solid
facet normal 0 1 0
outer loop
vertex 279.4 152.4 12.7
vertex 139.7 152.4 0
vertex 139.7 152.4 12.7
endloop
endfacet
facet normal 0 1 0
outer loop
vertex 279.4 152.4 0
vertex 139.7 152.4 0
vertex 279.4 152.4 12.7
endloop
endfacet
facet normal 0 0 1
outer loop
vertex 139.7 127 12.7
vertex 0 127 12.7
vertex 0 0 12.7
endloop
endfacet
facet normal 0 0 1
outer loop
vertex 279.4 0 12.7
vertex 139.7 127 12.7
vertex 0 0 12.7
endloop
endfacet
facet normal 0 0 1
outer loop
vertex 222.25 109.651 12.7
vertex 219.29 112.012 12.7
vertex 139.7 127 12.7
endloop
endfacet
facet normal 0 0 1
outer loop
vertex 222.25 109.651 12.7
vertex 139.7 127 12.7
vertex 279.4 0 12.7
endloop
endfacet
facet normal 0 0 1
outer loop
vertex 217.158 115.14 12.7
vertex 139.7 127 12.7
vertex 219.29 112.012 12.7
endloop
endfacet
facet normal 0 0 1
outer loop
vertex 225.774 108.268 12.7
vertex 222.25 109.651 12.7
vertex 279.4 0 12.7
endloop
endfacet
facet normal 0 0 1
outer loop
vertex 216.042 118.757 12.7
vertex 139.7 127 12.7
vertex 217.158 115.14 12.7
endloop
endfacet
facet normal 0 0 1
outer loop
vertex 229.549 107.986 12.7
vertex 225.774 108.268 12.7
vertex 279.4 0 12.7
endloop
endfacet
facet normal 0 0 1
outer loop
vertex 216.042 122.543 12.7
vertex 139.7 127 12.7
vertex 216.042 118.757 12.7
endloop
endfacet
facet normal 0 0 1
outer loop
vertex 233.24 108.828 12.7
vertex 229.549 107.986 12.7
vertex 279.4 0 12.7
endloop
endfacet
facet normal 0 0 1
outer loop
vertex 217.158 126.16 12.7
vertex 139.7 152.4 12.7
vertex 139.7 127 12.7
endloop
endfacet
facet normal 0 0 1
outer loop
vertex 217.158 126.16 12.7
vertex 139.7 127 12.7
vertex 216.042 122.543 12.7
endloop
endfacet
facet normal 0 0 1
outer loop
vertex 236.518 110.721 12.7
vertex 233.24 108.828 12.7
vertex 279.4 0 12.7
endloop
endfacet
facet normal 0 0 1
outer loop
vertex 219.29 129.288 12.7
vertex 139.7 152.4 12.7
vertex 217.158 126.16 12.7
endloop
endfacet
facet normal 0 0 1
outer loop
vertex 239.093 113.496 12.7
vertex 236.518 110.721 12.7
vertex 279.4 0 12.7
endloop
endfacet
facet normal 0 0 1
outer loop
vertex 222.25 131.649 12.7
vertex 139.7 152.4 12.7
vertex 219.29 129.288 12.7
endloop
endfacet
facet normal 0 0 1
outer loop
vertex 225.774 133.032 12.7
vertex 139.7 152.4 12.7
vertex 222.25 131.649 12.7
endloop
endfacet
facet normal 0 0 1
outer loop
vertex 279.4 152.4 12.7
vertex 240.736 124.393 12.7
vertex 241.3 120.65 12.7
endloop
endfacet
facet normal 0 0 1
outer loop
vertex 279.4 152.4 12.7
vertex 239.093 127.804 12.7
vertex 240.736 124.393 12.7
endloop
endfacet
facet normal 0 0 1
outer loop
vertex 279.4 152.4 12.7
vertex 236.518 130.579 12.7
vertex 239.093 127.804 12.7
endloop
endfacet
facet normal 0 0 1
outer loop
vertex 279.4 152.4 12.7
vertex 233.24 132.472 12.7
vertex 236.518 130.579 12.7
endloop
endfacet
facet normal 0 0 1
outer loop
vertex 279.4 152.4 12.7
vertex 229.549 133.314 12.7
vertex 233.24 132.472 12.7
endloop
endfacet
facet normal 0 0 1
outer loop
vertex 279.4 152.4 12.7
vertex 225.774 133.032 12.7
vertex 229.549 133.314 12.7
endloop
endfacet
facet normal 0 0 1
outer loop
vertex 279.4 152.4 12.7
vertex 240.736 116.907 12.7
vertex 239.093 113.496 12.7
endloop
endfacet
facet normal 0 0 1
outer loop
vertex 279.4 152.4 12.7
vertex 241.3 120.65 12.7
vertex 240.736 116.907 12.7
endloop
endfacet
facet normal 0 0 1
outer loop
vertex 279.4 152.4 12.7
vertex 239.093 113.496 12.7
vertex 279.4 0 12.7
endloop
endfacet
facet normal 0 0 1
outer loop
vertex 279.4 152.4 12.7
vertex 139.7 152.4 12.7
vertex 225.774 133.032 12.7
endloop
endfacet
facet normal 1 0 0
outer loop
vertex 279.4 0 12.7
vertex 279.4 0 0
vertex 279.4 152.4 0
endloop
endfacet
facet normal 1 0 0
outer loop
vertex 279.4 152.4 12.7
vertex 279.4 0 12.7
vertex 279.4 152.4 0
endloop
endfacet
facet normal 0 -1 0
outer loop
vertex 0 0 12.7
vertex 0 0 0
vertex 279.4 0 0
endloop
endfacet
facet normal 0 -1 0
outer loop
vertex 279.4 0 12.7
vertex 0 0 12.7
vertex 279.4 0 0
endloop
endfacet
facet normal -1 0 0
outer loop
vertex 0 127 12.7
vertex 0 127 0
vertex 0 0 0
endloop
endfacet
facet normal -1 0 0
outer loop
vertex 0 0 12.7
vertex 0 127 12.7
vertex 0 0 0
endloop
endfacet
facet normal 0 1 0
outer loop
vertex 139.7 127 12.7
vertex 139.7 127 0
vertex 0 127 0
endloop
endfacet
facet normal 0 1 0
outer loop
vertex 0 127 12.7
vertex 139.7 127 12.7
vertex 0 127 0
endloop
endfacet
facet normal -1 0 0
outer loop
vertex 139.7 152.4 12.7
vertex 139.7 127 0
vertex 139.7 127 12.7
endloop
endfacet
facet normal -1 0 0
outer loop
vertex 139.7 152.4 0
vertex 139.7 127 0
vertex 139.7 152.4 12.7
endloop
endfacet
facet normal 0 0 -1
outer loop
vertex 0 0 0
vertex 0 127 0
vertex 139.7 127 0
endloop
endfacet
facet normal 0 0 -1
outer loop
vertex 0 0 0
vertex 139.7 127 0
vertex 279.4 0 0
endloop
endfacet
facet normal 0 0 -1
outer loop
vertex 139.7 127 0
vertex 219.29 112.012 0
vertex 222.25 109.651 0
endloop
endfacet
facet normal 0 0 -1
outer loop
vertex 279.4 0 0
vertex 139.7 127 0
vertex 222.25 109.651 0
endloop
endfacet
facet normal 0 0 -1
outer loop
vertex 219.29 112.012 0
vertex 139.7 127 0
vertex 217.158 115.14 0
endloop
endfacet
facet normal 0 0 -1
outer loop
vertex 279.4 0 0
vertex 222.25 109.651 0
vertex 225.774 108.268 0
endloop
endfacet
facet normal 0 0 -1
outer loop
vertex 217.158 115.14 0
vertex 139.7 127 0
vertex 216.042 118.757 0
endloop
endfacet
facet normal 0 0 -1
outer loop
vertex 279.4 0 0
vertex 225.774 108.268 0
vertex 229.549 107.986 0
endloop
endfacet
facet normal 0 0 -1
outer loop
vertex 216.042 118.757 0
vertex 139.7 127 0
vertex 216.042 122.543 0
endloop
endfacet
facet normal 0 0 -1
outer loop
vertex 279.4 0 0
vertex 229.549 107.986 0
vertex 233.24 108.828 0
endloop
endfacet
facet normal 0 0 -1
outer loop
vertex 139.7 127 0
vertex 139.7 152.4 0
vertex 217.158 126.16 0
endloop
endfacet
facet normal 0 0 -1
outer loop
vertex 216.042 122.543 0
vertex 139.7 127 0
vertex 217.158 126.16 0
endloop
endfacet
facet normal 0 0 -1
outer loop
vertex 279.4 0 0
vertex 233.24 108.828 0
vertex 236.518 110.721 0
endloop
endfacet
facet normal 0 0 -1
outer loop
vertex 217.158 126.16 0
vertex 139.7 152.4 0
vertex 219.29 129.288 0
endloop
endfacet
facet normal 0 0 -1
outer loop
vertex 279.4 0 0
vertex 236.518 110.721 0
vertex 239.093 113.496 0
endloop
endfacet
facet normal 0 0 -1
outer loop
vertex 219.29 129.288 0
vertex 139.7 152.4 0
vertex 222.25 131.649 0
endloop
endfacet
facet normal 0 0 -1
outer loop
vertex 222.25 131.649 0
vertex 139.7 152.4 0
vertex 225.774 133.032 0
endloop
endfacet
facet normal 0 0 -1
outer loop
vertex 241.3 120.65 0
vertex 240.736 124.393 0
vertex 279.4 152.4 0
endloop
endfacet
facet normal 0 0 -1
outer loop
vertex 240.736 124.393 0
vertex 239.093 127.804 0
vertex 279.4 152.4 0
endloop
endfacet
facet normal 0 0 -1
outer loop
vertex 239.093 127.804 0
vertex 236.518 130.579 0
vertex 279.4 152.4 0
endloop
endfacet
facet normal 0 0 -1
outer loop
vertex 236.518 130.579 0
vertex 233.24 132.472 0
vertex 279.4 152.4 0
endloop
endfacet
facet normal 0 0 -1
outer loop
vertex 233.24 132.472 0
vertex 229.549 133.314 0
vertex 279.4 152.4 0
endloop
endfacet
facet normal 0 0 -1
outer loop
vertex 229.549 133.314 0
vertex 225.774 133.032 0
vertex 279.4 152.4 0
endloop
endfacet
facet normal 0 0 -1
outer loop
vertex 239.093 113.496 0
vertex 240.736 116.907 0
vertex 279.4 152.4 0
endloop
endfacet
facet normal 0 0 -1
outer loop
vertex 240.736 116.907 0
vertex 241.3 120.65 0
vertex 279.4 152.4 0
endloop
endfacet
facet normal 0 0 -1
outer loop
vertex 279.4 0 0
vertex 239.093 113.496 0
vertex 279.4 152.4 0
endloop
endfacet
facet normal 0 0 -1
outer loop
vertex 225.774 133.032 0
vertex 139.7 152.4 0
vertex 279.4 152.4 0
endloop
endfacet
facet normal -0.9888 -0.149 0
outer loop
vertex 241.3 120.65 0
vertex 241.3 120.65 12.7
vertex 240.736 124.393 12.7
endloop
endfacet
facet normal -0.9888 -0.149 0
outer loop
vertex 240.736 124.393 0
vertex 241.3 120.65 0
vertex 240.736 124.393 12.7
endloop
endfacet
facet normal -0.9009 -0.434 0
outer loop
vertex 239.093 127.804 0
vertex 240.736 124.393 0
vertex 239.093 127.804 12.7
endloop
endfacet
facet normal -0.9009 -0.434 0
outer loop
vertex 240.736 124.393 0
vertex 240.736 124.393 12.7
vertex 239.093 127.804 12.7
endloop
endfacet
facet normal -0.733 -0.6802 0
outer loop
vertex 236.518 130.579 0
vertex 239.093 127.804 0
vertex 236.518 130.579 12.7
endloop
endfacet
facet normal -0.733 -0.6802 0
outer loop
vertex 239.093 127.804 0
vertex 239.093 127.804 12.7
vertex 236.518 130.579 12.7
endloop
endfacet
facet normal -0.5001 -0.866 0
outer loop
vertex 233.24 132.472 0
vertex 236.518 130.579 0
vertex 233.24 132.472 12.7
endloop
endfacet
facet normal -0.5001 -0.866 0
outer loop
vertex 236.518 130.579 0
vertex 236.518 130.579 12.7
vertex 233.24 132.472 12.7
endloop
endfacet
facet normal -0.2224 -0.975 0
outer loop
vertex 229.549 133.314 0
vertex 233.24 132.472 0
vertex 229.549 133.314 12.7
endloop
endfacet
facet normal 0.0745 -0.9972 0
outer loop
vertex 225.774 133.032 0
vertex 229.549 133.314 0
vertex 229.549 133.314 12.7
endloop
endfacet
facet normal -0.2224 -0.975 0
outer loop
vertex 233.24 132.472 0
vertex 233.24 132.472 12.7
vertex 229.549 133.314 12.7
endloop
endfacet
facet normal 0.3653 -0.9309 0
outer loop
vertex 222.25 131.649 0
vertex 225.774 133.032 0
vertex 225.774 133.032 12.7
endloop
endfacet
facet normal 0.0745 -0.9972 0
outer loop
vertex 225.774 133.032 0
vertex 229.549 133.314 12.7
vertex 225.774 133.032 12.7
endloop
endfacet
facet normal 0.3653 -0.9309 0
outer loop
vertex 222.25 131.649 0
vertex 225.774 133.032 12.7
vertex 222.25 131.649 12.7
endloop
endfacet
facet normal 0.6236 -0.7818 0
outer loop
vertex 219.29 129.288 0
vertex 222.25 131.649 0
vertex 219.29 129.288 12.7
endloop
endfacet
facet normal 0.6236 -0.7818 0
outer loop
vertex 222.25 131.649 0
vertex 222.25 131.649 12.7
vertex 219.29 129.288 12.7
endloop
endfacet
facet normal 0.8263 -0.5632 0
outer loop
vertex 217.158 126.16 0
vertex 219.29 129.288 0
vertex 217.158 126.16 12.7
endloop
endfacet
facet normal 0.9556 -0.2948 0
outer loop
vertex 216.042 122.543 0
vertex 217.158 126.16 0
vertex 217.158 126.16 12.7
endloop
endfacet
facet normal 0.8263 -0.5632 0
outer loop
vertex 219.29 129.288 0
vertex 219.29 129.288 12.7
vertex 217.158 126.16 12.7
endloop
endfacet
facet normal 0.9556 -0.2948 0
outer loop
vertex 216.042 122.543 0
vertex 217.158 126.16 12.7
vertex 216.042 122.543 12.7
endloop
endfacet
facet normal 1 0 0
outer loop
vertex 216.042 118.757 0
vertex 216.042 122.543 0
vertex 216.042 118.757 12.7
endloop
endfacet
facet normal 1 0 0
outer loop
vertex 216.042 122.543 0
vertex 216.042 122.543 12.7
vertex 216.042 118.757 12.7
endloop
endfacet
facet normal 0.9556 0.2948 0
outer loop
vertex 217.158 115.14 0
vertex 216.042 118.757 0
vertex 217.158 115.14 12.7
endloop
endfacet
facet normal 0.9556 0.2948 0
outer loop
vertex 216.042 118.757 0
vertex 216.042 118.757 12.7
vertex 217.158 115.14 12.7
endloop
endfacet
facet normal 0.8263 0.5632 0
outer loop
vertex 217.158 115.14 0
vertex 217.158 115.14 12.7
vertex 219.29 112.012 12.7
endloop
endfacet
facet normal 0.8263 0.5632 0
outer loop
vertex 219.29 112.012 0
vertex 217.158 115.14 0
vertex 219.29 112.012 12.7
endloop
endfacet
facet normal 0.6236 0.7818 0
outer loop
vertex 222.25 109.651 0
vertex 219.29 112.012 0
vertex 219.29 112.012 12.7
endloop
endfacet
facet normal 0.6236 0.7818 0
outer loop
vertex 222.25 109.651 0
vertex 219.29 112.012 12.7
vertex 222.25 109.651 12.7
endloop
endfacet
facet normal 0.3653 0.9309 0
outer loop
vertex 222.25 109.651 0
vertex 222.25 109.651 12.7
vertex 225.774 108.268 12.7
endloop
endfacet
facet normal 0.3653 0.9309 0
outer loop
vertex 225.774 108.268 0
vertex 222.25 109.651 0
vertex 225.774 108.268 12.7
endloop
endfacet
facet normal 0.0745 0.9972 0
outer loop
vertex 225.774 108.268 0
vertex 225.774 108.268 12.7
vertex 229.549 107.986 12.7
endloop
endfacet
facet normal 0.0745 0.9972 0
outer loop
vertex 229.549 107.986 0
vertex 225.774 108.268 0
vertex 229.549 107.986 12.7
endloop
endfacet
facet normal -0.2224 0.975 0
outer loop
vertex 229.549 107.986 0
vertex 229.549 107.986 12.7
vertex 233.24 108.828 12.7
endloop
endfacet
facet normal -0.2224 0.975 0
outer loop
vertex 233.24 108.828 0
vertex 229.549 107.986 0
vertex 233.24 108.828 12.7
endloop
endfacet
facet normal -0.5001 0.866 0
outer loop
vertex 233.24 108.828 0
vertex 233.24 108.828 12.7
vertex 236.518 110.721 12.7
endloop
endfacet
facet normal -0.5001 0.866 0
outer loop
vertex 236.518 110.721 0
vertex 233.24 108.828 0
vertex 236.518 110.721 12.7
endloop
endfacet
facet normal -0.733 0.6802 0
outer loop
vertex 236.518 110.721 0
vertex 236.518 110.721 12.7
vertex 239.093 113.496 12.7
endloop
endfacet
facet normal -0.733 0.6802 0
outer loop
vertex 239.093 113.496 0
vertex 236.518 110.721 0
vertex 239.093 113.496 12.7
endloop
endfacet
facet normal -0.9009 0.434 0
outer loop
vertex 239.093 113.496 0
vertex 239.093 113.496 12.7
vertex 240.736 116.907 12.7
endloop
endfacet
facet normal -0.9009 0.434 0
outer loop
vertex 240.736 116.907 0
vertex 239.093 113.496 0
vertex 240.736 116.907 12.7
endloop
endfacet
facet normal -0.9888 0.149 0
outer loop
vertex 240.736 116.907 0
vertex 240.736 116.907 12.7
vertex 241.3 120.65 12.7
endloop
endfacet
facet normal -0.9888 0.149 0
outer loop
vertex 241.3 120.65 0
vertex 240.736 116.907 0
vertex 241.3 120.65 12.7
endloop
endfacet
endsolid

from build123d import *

# Parameters (mm, degrees)
F0_W     = 139.7
F0_H     = 25.4
F1_DEPTH = 12.7
F2_R     = 12.7
F3_DEPTH = 12.701


# Not quite as in the source:
# - a feature names something its author has since deleted; it is built from what else it names


with BuildPart() as f1:
    # F0 (on Top) → F1 (new body)
    with BuildSketch(Plane.XY):
        Polygon((0, 127), (0, 0), (279.4, 0), (279.4, 127), (139.7, 127), align=None)
        with Locations((209.55, 139.7)):
            Rectangle(F0_W, F0_H)
    extrude(amount=F1_DEPTH)

    # F2 (on face) → F3 (cut, through all)
    with BuildSketch(Plane.XY.offset(12.7)):
        with Locations((228.6, 120.65)):
            Circle(F2_R)
    extrude(amount=-F3_DEPTH, mode=Mode.SUBTRACT)


solid = f1.part
